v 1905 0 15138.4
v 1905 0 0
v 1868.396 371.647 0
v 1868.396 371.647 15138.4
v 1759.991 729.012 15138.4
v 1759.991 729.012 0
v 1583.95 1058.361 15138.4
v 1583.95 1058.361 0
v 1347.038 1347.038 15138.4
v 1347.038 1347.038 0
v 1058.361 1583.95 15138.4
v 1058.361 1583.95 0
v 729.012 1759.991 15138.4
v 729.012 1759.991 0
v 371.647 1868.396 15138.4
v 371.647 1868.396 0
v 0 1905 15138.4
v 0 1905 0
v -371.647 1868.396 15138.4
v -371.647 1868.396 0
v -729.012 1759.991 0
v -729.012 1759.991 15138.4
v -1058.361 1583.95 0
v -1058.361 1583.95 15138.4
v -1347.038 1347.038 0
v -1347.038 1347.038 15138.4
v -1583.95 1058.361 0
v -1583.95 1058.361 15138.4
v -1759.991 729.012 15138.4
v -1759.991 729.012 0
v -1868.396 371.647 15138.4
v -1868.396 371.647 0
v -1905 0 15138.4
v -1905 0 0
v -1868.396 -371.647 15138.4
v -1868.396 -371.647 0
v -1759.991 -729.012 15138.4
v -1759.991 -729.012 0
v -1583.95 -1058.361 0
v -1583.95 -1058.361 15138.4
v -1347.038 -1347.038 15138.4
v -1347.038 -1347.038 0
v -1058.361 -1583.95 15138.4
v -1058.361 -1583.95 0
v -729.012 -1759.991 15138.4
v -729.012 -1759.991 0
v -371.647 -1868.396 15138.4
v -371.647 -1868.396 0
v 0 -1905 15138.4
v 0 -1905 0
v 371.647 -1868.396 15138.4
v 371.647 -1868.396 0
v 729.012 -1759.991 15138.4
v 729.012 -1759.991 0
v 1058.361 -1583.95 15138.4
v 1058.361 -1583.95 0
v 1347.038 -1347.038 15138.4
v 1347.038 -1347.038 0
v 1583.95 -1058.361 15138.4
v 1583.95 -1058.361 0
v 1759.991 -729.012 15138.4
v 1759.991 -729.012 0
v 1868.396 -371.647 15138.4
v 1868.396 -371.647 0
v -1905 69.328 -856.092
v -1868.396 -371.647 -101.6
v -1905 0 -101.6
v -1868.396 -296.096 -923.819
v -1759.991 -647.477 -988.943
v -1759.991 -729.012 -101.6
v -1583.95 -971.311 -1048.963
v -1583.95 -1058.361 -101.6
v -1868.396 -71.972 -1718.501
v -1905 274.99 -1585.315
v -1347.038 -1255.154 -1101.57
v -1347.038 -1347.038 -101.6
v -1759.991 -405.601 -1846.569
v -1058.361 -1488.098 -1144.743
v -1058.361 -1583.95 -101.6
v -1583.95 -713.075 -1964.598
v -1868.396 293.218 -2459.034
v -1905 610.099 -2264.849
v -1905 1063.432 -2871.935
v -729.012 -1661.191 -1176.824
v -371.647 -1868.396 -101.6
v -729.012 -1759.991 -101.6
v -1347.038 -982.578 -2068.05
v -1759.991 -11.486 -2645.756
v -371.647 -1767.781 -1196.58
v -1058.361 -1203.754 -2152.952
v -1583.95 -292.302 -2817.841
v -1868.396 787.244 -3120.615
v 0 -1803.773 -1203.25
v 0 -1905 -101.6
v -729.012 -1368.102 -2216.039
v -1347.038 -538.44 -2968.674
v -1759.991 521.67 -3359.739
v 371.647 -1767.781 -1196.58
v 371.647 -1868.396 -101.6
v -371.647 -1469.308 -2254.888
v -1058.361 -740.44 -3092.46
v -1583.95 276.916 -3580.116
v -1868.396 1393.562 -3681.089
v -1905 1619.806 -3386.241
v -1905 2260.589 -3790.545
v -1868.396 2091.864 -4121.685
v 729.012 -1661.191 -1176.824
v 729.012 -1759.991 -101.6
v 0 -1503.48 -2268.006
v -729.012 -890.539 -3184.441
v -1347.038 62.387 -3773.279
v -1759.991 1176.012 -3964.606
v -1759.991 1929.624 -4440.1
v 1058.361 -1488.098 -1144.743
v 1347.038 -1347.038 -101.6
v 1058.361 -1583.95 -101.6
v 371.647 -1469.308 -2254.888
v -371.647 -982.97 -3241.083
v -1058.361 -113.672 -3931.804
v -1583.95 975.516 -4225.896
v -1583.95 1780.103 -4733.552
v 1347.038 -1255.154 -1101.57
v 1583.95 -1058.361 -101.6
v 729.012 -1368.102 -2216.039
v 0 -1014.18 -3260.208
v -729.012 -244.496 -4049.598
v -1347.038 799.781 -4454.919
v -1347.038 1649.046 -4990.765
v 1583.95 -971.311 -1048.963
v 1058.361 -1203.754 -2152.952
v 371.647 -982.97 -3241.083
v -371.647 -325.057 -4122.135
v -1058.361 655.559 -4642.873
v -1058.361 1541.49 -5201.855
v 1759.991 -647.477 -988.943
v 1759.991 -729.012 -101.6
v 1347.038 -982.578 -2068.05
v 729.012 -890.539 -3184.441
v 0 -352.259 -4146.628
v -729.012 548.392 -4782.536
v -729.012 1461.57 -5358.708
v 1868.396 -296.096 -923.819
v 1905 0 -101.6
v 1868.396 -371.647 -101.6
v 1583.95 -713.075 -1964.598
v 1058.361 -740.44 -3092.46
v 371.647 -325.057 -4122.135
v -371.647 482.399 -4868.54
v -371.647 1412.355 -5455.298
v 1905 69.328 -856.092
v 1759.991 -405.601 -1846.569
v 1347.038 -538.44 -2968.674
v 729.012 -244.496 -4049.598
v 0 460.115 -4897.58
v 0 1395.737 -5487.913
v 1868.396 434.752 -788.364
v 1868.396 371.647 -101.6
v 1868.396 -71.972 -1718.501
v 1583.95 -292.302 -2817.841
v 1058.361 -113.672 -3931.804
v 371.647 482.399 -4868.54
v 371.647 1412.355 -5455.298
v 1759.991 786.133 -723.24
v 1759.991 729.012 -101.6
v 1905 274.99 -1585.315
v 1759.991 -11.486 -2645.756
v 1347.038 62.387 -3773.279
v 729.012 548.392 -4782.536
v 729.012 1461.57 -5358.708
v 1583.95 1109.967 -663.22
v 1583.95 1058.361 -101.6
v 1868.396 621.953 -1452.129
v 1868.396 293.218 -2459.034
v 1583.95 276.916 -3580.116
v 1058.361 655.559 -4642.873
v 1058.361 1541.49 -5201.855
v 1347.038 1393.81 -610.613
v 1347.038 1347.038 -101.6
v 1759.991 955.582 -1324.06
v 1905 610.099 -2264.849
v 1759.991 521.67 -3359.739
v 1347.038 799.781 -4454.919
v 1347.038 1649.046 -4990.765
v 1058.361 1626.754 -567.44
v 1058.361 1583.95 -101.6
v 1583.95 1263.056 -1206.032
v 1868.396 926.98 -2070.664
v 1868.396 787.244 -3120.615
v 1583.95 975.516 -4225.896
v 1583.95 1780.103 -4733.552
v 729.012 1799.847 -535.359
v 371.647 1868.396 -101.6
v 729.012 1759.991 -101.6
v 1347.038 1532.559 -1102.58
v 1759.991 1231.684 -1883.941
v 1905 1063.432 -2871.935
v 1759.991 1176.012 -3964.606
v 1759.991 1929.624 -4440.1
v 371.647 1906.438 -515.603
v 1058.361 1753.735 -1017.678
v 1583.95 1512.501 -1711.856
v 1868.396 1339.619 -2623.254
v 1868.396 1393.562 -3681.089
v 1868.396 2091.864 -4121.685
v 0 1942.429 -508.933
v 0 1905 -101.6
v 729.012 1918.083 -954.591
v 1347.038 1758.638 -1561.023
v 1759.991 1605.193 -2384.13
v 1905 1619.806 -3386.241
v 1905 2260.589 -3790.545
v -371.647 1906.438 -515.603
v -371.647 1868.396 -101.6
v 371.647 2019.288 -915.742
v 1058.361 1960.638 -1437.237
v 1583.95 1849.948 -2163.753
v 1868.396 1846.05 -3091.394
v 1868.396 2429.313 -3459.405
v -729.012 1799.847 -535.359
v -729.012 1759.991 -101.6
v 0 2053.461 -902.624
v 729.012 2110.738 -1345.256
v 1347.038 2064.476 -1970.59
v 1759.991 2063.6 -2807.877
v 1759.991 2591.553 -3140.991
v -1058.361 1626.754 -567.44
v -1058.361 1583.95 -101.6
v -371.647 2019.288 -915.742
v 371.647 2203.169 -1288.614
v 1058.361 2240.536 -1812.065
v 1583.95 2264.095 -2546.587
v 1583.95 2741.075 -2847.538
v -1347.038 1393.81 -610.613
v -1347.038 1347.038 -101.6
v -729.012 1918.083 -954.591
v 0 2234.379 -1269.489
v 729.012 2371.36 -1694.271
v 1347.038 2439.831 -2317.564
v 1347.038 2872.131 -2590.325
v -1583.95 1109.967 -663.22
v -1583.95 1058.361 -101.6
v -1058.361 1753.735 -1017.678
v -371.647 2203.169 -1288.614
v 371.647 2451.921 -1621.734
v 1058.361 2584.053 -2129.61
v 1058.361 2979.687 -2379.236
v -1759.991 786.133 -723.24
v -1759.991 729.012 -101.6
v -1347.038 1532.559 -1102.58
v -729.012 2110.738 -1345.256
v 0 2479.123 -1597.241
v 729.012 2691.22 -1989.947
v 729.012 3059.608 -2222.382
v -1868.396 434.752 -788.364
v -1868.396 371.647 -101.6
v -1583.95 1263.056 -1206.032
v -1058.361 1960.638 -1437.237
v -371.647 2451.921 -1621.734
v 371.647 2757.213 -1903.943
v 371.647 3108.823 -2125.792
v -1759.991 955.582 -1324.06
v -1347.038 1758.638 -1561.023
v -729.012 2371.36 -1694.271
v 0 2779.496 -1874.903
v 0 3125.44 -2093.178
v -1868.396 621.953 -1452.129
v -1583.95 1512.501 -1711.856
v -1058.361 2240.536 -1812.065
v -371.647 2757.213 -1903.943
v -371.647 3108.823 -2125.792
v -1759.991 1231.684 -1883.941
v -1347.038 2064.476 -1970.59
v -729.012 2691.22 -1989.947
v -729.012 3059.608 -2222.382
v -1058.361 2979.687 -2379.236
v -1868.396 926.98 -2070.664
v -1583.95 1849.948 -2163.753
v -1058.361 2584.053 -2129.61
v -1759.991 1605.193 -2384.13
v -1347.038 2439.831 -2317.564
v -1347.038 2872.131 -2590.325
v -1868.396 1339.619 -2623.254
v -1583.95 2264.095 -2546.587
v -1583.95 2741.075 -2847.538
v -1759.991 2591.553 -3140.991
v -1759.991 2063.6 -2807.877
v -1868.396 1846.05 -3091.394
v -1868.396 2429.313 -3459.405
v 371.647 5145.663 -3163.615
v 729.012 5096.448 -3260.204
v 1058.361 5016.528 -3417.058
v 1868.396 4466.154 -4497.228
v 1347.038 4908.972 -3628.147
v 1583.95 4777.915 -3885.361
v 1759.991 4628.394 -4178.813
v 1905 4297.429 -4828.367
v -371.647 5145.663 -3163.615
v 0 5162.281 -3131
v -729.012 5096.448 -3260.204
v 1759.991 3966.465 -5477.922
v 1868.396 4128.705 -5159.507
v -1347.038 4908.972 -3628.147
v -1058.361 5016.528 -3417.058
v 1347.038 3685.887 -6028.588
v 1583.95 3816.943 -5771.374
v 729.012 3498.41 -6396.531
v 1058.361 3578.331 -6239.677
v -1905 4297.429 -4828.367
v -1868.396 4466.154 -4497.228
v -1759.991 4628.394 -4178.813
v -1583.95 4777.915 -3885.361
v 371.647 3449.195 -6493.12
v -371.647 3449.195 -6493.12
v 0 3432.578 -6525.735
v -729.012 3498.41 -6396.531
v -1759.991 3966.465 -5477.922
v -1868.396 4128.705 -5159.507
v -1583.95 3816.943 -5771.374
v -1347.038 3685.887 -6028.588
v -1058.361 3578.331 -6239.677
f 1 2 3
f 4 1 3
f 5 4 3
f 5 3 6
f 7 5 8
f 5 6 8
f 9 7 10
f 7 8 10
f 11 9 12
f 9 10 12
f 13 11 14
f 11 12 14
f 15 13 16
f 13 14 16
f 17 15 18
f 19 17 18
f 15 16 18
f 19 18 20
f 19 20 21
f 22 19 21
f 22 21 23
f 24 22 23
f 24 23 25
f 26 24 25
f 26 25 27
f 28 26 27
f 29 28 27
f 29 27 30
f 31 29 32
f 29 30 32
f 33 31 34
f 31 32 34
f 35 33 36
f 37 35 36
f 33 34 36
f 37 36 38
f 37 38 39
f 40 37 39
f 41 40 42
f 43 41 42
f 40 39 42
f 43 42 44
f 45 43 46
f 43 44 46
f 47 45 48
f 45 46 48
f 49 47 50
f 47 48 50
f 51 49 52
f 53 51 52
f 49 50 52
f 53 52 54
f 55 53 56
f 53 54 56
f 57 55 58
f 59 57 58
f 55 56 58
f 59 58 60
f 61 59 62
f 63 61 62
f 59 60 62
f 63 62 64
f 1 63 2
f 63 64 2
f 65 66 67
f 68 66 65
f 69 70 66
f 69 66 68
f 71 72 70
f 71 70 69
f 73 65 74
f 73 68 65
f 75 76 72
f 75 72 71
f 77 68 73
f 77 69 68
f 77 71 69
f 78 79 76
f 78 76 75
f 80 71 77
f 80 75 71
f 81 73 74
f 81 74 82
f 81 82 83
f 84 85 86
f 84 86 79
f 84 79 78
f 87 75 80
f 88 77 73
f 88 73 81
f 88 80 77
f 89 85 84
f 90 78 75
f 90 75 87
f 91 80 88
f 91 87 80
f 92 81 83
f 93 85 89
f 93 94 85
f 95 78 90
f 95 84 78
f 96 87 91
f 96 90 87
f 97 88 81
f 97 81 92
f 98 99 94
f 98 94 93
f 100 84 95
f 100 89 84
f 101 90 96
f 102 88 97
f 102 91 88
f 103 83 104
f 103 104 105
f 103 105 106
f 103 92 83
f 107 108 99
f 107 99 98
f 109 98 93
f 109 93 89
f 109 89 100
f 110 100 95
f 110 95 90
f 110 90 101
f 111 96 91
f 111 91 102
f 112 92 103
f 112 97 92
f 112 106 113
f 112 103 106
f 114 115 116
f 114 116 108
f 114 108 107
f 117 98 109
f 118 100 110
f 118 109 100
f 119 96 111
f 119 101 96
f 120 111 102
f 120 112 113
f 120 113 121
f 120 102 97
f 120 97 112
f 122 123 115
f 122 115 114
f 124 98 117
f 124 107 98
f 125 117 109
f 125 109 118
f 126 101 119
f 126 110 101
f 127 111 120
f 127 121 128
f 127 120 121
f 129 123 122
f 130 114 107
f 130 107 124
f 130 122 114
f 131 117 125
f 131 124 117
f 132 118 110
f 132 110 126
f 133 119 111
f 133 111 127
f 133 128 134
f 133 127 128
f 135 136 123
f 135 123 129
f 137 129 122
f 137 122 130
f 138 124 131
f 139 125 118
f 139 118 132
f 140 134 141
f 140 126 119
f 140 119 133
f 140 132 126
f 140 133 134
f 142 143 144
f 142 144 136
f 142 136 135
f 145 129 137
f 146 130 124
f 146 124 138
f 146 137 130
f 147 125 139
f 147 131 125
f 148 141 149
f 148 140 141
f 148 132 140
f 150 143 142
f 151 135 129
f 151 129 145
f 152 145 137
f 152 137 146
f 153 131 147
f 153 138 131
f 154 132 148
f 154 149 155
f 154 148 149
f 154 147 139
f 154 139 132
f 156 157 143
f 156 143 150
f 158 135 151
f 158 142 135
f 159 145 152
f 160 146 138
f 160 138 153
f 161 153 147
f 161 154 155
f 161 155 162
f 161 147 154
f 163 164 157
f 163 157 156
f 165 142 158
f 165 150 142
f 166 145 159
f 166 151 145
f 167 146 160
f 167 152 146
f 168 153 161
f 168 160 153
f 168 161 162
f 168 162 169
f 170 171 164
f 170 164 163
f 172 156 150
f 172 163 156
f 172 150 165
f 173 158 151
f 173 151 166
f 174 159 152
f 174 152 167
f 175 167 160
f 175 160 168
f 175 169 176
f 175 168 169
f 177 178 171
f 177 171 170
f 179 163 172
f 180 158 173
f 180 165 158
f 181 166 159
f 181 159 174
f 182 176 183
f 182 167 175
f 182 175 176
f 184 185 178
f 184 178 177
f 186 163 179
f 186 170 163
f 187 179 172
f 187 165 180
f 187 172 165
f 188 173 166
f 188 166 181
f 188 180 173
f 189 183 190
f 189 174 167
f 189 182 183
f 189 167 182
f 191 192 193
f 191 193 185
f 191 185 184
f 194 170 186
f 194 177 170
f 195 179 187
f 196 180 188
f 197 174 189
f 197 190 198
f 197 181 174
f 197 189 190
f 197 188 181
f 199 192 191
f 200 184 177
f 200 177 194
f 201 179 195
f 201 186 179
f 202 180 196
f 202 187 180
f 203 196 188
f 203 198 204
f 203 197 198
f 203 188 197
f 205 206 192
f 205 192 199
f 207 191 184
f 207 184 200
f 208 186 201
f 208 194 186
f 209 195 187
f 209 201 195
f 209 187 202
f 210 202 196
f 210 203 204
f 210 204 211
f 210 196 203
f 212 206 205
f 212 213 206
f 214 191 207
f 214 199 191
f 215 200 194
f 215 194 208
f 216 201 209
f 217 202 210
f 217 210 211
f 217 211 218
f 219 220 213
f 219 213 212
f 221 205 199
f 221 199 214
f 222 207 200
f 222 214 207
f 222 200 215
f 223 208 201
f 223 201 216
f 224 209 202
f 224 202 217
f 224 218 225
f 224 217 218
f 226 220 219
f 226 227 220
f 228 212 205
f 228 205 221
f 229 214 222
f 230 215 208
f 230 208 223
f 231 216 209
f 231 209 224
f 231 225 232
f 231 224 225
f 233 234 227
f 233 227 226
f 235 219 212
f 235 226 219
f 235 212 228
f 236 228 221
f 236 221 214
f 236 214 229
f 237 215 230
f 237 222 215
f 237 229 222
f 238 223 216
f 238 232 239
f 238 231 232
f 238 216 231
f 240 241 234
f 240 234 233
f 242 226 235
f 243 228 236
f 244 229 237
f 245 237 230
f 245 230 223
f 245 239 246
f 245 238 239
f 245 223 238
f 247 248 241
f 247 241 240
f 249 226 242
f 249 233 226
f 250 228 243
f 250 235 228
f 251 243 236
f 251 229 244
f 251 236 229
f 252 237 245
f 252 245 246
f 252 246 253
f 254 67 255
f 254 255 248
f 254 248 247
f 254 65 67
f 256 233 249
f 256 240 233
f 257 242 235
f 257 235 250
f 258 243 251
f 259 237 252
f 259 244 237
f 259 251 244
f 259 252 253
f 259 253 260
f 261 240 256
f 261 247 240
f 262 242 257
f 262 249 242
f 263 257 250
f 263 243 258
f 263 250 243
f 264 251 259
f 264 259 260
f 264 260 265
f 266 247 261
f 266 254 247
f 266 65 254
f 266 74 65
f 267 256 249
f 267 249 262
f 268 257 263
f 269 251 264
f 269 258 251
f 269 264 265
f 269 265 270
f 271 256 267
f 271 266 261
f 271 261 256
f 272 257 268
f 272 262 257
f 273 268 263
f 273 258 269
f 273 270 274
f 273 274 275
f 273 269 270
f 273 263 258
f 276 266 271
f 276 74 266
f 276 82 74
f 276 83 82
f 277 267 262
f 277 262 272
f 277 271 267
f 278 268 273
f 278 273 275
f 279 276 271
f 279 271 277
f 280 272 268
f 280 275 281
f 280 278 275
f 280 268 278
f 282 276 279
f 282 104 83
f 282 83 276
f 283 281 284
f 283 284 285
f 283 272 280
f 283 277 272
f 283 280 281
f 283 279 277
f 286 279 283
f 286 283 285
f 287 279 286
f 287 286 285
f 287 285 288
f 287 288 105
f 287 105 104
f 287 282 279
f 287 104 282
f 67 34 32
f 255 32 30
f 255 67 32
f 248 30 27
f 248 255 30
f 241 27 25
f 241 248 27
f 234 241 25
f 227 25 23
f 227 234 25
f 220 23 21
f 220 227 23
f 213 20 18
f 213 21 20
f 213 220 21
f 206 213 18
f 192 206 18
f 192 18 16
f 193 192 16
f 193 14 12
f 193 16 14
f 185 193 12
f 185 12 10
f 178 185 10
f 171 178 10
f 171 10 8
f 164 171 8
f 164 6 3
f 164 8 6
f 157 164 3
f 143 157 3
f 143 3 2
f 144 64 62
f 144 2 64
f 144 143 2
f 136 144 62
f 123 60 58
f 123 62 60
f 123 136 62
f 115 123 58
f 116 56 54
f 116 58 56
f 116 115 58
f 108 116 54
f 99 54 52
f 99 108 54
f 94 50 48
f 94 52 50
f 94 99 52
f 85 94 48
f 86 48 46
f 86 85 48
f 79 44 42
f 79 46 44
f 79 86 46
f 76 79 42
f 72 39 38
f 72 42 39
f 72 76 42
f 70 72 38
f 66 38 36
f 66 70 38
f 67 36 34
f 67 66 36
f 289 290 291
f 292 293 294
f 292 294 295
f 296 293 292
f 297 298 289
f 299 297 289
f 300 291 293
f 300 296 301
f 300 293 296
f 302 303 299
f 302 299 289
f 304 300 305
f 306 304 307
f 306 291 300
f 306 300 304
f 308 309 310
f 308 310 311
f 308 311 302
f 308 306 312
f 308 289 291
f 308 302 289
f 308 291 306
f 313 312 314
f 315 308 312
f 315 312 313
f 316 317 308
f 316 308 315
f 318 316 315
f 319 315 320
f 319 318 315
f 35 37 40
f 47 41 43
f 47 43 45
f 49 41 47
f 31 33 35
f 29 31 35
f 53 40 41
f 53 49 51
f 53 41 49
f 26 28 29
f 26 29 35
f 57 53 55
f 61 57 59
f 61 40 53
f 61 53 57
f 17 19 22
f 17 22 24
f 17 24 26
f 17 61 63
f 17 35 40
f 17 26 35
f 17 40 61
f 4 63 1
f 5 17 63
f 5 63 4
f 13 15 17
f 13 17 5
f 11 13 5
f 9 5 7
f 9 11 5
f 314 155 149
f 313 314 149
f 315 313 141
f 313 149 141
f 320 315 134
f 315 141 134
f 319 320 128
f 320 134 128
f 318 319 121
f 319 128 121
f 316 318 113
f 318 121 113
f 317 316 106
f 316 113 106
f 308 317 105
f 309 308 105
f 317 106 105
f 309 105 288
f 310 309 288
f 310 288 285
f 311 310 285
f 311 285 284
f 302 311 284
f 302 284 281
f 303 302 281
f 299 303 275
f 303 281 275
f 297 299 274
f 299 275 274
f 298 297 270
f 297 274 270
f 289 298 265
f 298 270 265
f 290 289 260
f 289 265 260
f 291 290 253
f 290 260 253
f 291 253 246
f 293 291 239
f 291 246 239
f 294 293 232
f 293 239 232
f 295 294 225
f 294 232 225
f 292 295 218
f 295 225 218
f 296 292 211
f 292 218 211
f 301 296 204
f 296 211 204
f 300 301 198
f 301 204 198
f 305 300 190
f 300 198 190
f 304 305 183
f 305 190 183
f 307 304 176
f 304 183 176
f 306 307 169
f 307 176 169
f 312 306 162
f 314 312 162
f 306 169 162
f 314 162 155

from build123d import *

# Parameters (mm, degrees)
SKETCH1_R           = 1905
BOSS_EXTRUDE1_DEPTH = 15138.4
SKETCH2_R           = 1905
SKETCH4_R           = 1905
BOSS_EXTRUDE2_DEPTH = 2286


with BuildPart() as part:
    # Sketch1 → Boss-Extrude1 (new body)
    with BuildSketch(Plane.XY):
        Circle(SKETCH1_R)
    extrude(amount=BOSS_EXTRUDE1_DEPTH)

    # Sweep1: sweep along a path in Sketch3
    with BuildLine(Plane(origin=(0, 0, 0), x_dir=(0, 0, -1), z_dir=(1, 0, 0))) as sweep1_path:
        Line((0, 0), (101.6, 0))
        ThreePointArc((101.6, 0), (2264.848557637, 610.099191541), (3790.545211445, 2260.588532978))
    # Sketch2 → Sweep1 (sweep)
    with BuildSketch(Plane(origin=(0, 0, 0), x_dir=(-1, 0, 0), z_dir=(0, 0, -1))):
        Circle(SKETCH2_R)
    sweep(path=sweep1_path.line)

    # Sketch4 → Boss-Extrude2 (add)
    with BuildSketch(Plane(origin=(0, 3327.972314085, -1695.686589239), x_dir=(1, 0, 0), z_dir=(0, 0.8910065241883625, -0.45399049973955735))):
        with Locations(Location((0, 2351.114795836, 0), (0, 0, 90))):
            Circle(SKETCH4_R)
    extrude(amount=BOSS_EXTRUDE2_DEPTH)


solid = part.part
